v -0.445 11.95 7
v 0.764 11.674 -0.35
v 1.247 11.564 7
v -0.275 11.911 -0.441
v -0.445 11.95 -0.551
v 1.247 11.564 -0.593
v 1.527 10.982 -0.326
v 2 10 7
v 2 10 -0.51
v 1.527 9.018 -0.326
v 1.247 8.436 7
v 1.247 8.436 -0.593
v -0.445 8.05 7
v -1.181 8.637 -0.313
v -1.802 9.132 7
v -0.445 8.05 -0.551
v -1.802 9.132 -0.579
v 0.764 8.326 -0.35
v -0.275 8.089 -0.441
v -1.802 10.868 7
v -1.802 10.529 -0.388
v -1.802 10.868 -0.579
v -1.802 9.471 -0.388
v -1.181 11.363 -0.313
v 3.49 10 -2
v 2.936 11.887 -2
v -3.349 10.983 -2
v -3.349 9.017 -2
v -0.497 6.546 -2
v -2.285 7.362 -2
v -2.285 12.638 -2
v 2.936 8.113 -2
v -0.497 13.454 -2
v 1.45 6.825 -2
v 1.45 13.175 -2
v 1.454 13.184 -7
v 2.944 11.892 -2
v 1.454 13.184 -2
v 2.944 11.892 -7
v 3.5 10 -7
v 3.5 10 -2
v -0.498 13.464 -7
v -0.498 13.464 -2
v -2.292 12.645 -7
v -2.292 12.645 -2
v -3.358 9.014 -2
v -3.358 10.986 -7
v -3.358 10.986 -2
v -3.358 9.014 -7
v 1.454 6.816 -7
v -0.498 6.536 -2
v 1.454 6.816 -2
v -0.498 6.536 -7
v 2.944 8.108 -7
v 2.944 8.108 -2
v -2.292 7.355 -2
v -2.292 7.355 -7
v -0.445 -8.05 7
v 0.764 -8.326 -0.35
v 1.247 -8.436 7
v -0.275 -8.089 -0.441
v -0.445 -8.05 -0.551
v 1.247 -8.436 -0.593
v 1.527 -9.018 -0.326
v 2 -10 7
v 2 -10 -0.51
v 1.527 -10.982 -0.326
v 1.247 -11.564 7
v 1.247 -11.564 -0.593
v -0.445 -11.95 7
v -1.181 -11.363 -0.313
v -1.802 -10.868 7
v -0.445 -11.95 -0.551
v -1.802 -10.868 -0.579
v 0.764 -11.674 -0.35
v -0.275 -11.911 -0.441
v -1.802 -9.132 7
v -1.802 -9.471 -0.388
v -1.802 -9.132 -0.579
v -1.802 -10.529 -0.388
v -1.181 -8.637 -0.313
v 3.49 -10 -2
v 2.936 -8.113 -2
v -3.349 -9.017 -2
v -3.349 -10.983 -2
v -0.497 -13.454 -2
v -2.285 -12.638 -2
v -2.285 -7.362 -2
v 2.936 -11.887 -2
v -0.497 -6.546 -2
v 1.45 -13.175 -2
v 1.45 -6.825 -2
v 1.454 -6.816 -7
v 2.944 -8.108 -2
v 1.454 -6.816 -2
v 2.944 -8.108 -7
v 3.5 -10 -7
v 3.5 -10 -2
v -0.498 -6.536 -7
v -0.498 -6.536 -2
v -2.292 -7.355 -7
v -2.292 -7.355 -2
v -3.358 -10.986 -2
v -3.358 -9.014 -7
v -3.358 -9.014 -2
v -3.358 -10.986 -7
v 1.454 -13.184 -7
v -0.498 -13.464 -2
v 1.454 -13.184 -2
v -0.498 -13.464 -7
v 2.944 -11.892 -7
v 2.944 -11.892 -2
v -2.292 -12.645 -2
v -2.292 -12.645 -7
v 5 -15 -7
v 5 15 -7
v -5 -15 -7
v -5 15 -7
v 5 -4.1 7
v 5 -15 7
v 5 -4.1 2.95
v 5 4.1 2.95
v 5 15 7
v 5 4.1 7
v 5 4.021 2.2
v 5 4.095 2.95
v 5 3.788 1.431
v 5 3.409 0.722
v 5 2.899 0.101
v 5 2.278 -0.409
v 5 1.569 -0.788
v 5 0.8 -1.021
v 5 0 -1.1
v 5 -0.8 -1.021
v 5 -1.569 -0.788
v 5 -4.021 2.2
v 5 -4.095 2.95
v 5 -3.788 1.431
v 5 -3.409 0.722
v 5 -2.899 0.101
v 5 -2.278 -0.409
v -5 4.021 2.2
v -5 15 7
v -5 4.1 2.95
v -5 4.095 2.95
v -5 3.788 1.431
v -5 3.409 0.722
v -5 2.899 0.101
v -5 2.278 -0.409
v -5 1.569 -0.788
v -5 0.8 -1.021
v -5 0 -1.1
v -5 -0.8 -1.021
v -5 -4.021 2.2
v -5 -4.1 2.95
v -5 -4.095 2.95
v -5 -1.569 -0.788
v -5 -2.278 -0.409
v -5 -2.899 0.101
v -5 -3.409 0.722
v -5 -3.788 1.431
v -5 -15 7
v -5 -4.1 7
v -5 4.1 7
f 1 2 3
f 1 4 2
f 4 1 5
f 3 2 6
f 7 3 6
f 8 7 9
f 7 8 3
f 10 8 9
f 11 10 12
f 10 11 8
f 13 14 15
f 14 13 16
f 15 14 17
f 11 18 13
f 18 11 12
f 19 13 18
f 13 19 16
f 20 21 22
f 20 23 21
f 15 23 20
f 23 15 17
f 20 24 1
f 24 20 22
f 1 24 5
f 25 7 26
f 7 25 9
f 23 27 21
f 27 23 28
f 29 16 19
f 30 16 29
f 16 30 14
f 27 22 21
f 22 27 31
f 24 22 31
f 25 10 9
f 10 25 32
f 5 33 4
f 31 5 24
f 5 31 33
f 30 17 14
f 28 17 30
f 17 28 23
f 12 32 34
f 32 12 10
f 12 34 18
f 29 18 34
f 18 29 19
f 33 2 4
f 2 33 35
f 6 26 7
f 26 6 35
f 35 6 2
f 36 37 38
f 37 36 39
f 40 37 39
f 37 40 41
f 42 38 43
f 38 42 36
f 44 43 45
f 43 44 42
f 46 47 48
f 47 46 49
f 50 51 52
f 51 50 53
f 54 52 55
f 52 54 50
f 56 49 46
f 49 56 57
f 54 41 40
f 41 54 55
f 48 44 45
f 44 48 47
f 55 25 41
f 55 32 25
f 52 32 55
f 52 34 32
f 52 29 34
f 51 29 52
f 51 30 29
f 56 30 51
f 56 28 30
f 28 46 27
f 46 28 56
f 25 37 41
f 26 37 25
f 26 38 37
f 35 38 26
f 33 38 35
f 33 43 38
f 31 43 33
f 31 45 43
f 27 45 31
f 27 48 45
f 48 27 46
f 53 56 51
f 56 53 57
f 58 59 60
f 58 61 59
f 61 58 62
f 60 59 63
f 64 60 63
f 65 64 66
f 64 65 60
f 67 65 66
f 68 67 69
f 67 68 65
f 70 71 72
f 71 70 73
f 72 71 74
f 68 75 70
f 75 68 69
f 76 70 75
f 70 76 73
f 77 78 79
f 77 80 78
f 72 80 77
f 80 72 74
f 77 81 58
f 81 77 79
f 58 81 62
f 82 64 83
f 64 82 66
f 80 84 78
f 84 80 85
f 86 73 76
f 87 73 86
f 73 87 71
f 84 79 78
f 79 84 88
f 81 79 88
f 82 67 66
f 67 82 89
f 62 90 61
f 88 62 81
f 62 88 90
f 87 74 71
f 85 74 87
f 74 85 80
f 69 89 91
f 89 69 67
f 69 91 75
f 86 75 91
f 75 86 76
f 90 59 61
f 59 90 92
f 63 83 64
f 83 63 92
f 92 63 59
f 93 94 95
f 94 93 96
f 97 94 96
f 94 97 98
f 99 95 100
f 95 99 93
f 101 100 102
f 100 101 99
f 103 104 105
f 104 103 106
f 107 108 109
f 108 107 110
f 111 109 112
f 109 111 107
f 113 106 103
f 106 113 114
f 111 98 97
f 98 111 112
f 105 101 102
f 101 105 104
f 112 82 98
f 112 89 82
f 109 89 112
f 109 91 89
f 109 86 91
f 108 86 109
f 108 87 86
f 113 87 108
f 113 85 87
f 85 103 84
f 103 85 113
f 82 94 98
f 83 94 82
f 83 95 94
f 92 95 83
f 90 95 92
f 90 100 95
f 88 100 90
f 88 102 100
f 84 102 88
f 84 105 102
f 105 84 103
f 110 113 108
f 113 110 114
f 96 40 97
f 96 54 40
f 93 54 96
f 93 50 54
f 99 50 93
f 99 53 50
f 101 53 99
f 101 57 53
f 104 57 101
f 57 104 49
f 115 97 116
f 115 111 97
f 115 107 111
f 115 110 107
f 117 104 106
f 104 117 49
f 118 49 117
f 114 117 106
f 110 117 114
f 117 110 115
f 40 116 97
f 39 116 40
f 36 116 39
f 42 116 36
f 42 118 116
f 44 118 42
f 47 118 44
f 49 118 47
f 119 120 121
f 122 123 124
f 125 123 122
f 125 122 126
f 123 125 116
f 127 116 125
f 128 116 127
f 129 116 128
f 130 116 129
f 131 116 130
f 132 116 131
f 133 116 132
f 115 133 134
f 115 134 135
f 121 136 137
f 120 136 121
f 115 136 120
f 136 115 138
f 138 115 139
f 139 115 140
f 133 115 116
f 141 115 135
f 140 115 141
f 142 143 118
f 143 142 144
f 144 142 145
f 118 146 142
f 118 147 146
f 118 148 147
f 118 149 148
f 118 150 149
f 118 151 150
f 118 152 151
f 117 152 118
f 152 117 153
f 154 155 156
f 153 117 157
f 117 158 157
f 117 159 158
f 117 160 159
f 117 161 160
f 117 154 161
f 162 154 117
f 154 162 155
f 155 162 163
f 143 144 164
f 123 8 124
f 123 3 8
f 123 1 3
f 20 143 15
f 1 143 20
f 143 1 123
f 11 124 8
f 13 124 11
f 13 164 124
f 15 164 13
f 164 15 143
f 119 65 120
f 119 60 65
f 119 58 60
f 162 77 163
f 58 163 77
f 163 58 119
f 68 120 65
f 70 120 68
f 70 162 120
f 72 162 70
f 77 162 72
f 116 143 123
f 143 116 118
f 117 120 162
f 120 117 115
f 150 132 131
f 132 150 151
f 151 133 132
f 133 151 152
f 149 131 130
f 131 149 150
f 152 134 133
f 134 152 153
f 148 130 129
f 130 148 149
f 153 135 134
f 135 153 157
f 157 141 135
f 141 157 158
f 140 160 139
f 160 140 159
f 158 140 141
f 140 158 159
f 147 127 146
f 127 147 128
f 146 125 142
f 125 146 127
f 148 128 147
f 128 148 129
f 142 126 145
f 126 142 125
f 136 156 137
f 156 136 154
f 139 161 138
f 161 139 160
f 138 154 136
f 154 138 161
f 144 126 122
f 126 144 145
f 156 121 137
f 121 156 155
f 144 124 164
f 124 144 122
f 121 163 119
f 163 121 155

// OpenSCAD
// file: inc/functions.scad
// PRUSA iteration3
// Functions used in many files
// GNU GPL v3
// Josef Průša <josefprusa@me.com>
// Václav 'ax' Hůla <axtheb@gmail.com>
// Vlnofka <>
// http://www.reprap.org/wiki/Prusa_Mendel
// http://github.com/prusajr/PrusaMendel


module nut(d,h,horizontal=true){
    cornerdiameter =  (d / 2) / cos (180 / 6);
    cylinder(h = h, r = cornerdiameter, $fn = 6);
    if(horizontal){
        for(i = [1:6]){
            rotate([0,0,60*i]) translate([-cornerdiameter-0.2,0,0]) rotate([0,0,-45]) cube([2,2,h]);
        }
    }
}

// Based on nophead research
module polyhole(d, h, center=false) {
    n = max(round(2 * d),3);
    rotate([0,0,180])
        cylinder(h = h, r = (d / 2) / cos (180 / n), $fn = n);
}

// make it interchangeable between this and cylinder
module cylinder_poly(r, h, center=false){
    polyhole(d=r*2, h=h, center=center);
}

module fillet(radius, height=100, $fn=0) {
    //this creates acutal fillet
    translate([-radius, -radius, -height/2-0.01])
        difference() {
            cube([radius*2, radius*2, height+0.02]);
            cylinder(r=radius, h=height+0.02, $fn=$fn);
        }
}

module cube_fillet(size, radius=-1, vertical=[3,3,3,3], top=[0,0,0,0], bottom=[0,0,0,0], center=false, $fn=0){
    //
    if (center) {
        cube_fillet_inside(size, radius, vertical, top, bottom, $fn);
    } else {
        translate([size[0]/2, size[1]/2, size[2]/2])
            cube_fillet_inside(size, radius, vertical, top, bottom, $fn);
    }
}

module cube_negative_fillet(size, radius=-1, vertical=[3,3,3,3], top=[0,0,0,0], bottom=[0,0,0,0], $fn=0){

    j=[1,0,1,0];

    for (i=[0:3]) {
        if (radius > -1) {
            rotate([0, 0, 90*i]) translate([size[1-j[i]]/2, size[j[i]]/2, 0]) fillet(radius, size[2], $fn=$fn);
        } else {
            rotate([0, 0, 90*i]) translate([size[1-j[i]]/2, size[j[i]]/2, 0]) fillet(vertical[i], size[2], $fn=$fn);
        }
        rotate([90*i, -90, 0]) translate([size[2]/2, size[j[i]]/2, 0 ]) fillet(top[i], size[1-j[i]], $fn=$fn);
        rotate([90*(4-i), 90, 0]) translate([size[2]/2, size[j[i]]/2, 0]) fillet(bottom[i], size[1-j[i]], $fn=$fn);

    }
}

module cube_fillet_inside(size, radius=-1, vertical=[3,3,3,3], top=[0,0,0,0], bottom=[0,0,0,0], $fn=0){
    //makes CENTERED cube with round corners
    // if you give it radius, it will fillet vertical corners.
    //othervise use vertical, top, bottom arrays
    //when viewed from top, it starts in upper right corner (+x,+y quadrant) , goes counterclockwise
    //top/bottom fillet starts in direction of Y axis and goes CCW too


    if (radius == 0) {
        cube(size, center=true);
    } else {
        difference() {
            cube(size, center=true);
            cube_negative_fillet(size, radius, vertical, top, bottom, $fn);
        }
    }
}


module nema17(places=[1,1,1,1], size=15.5, h=10, holes=false, shadow=false, $fn=0){
    for (i=[0:3]) {
        if (places[i] == 1) {
            rotate([0, 0, 90*i]) translate([size, size, 0]) {
                if (holes) {
                    rotate([0, 0, -90*i])  translate([0,0,-10]) screw(r=1.7, slant=false, head_drop=13, $fn=$fn, h=h+12);
                } else {
                    rotate([0, 0, -90*i]) cylinder(h=h, r=5.5, $fn=$fn);
                }
            }
        }
    }
    if (shadow != false) {
        %translate ([0, 0, shadow+21+3]) cube([42,42,42], center = true);
    //flange
        %translate ([0, 0, shadow+21+3-21-1]) cylinder(r=11,h=2, center = true, $fn=20);
    //shaft
        %translate ([0, 0, shadow+21+3-21-7]) cylinder(r=2.5,h=14, center = true);
    }
}

module screw(h=20, r=2, r_head=3.5, head_drop=0, slant=true, poly=false, $fn=0){
    //makes screw with head
    //for substraction as screw hole
    if (poly) {
        cylinder_poly(h=h, r=r, $fn=$fn);
    } else {
        cylinder(h=h, r=r, $fn=$fn);
    }
    if (slant) {
        translate([0, 0, head_drop-0.01]) cylinder(h=r_head, r2=0, r1=r_head, $fn=$fn);
    }

    if (head_drop > 0) {
        translate([0, 0, -0.01]) cylinder(h=head_drop+0.01, r=r_head, $fn=$fn);
    }
}

//cube_fillet([10,20,30], vertical=[3,2,0,0], top=[3,2,0,5], bottom=[3,2,0,5]);
//cube_fillet([10,20,30], radius=2, top=[7,2,7,2]);
// file: inc/metric.scad
// PRUSA iteration3
// Default metric sizes
// GNU GPL v3
// Josef Průša <josefprusa@me.com>
// http://www.reprap.org/wiki/Prusa_Mendel
// http://github.com/prusajr/PrusaMendel

// DONT CHANGE THIS FILE! ALTER VALUES IN CONFIGURATION.SCAD INSTEAD

// RODS

threaded_rod_diameter = 8.7;
threaded_rod_diameter_horizontal = 8.7;
smooth_bar_diameter = 8;
smooth_bar_diameter_horizontal = 8.5;

// Nuts and bolts

m8_diameter = 9;
m8_nut_diameter = 14.1;

m4_diameter = 4.5;
m4_nut_diameter = 9;

m3_diameter = 3.6;
m3_nut_diameter = 5.3;
m3_nut_diameter_horizontal = 6.1;

// Bushing holder

bushing_core_diameter = smooth_bar_diameter;
bushing_material_thickness = 1;

// Motors

motor_shaft = 5.5;
// file: configuration.scad
// PRUSA Mendel  
// Configuration file
// GNU GPL v3
// Josef Průša
// josefprusa@me.com
// prusadjs.cz
// http://www.reprap.org/wiki/Prusa_Mendel
// http://github.com/prusajr/PrusaMendel

// PLEASE SELECT ONE OF THE CONFIGURATIONS BELOW
// BY UN-COMMENTING IT

// Uncomment for metric settings
// METRIC METRIC METRIC METRIC METRIC METRIC METRIC METRIC 

include <inc/metric.scad>;

// CUSTOM CUSTOM CUSTOM CUSTOM CUSTOM CUSTOM CUSTOM CUSTOM CUSTOM

thin_wall = 3;


// Linear bearing version
linear = false;
// set false for LM-8UU, true for LM-E-8UU (ignore if linear is set to false)
lme8uu = false;

//Machine dimensions

board_thickness = 16;
board_to_xz_distance = 26;

belt_tooth_distance = 2.5;
belt_tooth_stride = 0.5;

// CHANGE ONLY THE STUFF YOU KNOW
// IT WILL REPLACE DEFAULT SETTING

// RODS

// threaded_rod_diameter = 0;
// threaded_rod_diameter_horizontal = 0;
// smooth_bar_diameter = 0;
// smooth_bar_diameter_horizontal = 0;

// Nuts and bolts

// m8_diameter = 0;
// m8_nut_diameter = 0;

// m4_diameter = 0;
// m4_nut_diameter = 0;

// m3_diameter = 0;
// m3_nut_diameter = 0;

// Bushing holder

// bushing_core_diameter = smooth_bar_diameter;
// bushing_material_thickness = 0;


///counted stuff
m3_nut_diameter_bigger = ((m3_nut_diameter  / 2) / cos (180 / 6))*2;

// functions
include <inc/functions.scad>
// main file
// PRUSA iteration3
// GNU GPL v3
// Josef Průša
// josefprusa@me.com
// prusadjs.cz


include <configuration.scad>


module rodclamp(){ 
	rotate([0,-270,0]) difference(){
		cube([14,30,10],center=true);
		translate([-3,0,0]) cylinder(r=4.1,h=20,center=true,$fn=32);
		translate([-5,0,0]) cube(size=[4.1,8.2,10], center=true);
		
		translate([7,10,0]) rotate([0,-90,0]) screw(head_drop=5);
		translate([7,-10,0]) rotate([0,-90,0]) screw(head_drop=5);
	}
}


rodclamp();
